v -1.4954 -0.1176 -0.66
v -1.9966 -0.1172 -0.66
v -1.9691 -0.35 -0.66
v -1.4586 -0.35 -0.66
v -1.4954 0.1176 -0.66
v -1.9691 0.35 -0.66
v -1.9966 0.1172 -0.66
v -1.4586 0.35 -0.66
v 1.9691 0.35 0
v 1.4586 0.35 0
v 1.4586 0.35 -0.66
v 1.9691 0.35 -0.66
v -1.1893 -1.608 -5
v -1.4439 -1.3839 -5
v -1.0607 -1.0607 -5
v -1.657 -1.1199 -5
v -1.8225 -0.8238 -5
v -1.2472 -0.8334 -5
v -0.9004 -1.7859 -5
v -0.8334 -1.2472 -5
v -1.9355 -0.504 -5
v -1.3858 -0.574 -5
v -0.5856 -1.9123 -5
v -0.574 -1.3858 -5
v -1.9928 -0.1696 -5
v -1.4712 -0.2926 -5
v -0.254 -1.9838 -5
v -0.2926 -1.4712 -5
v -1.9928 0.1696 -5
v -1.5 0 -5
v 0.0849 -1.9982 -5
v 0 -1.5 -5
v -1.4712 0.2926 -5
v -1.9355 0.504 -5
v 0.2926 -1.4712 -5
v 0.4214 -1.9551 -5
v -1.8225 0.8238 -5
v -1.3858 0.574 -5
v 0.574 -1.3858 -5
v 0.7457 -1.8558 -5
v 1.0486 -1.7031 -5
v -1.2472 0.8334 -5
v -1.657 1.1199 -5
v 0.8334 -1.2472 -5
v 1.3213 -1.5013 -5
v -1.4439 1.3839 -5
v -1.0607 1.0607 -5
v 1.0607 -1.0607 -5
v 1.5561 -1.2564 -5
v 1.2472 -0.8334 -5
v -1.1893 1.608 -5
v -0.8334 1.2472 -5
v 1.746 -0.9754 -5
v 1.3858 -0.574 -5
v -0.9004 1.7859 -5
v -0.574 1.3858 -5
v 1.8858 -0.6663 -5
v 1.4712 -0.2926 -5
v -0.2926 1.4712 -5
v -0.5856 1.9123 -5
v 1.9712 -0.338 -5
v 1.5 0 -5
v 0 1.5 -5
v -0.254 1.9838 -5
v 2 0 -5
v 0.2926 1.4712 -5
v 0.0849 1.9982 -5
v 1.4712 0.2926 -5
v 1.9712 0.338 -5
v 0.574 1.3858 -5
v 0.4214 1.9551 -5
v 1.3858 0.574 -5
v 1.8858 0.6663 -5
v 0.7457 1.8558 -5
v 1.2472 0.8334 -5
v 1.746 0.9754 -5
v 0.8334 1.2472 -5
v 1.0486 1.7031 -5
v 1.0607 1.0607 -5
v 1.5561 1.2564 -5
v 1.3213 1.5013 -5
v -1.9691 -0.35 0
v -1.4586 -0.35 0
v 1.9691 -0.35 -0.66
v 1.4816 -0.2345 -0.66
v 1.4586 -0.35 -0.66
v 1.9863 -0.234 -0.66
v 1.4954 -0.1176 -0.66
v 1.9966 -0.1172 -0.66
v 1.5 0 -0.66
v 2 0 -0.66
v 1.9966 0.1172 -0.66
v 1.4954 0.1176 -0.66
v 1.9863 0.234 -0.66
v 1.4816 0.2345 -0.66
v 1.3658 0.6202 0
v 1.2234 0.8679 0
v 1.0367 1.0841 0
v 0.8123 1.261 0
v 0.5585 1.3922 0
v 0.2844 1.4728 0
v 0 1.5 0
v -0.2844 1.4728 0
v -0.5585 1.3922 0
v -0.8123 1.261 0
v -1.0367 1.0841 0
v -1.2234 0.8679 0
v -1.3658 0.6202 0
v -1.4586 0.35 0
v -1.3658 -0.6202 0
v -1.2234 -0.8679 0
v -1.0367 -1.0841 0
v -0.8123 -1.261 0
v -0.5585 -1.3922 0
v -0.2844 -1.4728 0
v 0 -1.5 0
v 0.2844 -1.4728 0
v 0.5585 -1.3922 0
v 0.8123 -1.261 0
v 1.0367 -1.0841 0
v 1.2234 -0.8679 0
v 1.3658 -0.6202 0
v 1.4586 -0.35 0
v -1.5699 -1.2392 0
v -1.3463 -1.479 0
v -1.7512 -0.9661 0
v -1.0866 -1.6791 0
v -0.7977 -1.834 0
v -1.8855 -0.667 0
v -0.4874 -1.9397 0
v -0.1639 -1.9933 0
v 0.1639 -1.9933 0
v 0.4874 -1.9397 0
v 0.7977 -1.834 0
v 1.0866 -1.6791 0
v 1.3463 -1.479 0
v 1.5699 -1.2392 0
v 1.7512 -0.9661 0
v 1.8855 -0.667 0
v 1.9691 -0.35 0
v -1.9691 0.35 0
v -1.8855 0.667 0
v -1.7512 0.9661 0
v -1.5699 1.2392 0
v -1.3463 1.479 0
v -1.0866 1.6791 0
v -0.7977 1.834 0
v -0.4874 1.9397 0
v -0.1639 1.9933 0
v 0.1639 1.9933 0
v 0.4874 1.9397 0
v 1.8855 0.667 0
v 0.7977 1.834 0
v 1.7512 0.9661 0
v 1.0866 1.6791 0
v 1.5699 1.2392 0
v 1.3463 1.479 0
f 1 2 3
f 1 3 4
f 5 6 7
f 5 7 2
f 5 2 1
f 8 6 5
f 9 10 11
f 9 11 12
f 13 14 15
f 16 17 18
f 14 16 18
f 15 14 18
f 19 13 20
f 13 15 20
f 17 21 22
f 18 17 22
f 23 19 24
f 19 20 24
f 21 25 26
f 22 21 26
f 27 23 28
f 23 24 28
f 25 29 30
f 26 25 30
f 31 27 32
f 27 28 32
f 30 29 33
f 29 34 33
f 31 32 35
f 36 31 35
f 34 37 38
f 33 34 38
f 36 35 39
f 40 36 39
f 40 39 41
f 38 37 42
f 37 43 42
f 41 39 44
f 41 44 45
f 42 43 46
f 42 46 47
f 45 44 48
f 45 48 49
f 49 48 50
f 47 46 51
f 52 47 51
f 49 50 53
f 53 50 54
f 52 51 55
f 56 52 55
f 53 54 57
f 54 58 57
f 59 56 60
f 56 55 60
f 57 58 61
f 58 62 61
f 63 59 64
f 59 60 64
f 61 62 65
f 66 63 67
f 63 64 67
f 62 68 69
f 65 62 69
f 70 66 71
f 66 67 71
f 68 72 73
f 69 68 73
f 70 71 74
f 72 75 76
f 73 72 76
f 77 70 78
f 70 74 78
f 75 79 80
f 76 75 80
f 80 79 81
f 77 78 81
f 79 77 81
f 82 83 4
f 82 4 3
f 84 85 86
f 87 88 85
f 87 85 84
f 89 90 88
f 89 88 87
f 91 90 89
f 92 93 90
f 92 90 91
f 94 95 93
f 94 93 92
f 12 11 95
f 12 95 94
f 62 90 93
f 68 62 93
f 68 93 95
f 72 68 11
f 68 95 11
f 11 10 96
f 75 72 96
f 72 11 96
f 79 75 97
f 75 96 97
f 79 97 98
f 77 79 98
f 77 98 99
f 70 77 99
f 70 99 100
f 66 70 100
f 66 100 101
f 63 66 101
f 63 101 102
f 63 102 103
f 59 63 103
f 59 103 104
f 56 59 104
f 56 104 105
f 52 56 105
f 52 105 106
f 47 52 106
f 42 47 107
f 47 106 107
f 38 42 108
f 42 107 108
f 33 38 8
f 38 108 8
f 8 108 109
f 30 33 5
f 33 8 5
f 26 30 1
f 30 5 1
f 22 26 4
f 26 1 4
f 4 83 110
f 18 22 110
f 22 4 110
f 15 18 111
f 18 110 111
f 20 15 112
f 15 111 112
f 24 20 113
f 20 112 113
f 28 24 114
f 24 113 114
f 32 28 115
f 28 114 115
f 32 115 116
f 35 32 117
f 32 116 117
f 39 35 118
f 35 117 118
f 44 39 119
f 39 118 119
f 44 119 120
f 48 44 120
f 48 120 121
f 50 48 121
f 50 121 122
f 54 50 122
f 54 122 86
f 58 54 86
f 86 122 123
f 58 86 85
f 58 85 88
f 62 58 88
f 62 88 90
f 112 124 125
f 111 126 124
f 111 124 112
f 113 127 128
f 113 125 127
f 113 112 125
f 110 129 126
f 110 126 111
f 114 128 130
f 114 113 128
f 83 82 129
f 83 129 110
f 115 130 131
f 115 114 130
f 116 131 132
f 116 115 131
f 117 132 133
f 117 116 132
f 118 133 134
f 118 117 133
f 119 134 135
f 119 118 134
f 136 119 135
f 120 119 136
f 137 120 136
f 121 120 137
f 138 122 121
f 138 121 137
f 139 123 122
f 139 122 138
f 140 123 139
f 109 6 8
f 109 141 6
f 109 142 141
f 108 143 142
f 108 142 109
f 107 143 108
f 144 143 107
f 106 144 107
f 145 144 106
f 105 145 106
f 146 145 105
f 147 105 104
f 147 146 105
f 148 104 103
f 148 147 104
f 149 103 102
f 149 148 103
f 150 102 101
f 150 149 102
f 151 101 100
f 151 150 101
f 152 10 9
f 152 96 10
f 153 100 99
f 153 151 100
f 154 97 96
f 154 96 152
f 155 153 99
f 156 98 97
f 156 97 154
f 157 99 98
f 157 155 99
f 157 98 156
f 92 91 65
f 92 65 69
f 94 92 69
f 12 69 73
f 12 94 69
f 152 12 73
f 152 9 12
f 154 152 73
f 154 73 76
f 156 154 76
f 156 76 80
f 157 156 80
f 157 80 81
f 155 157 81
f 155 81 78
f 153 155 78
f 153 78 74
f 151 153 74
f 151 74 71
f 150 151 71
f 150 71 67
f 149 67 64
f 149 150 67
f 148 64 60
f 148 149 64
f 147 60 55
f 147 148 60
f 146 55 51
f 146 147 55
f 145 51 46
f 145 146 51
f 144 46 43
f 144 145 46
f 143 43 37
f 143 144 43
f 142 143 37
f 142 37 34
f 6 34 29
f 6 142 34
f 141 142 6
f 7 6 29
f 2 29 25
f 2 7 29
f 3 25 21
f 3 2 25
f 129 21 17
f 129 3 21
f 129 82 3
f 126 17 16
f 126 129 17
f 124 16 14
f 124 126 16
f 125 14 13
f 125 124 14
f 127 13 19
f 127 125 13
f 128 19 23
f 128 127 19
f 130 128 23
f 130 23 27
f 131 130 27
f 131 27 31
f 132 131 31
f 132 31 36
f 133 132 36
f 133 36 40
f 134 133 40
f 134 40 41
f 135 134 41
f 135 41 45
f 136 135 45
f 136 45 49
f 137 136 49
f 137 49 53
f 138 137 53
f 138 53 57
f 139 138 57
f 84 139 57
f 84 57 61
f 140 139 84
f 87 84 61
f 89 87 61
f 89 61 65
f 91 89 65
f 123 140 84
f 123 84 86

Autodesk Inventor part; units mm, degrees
ref_plane "YZ Plane" through (0, 0, 0) normal (1, 0, 0) x (0, 1, 0)
ref_plane "XZ Plane" through (0, 0, 0) normal (0, 1, 0) x (-1, 0, 0)
ref_plane "XY Plane" through (0, 0, 0) normal (0, 0, 1) x (1, 0, 0)
sketch "スケッチ1" plane through (0, 0, 0) normal (0, 0, 1) x (1, 0, 0)
  circle A0 centre (0, 0) radius 2
  circle A1 centre (0, 0) radius 1.5
  line L0 (-2, 0.35) -> (2, 0.35)
  line L1 (2, 0.35) -> (2, -0.35)
  line L2 (2, -0.35) -> (-2, -0.35)
  line L3 (-2, -0.35) -> (-2, 0.35)
  line L4 (-2, 0.35) -> (2, -0.35) construction
  line L5 (2, 0.35) -> (-2, -0.35) construction
  point P0 (1.4586, -0.35)
  point P1 (1.9691, -0.35)
  point P2 (1.9691, 0.35)
  point P3 (1.4586, 0.35)
  point P4 (-1.9691, -0.35)
  point P5 (-1.4586, -0.35)
  point P6 (-1.4586, 0.35)
  point P7 (-1.9691, 0.35)
  dimension "d0" = 4
  dimension "d1" = 3
  dimension "d8" = 0.7
extrude "押し出し1" add sketch "スケッチ1" against normal blind 5 contours A0 L2 A1 L0 | L0 A1 A0 | A0 L2 A1 | L0 A1 L2 A0
thread "ねじ1" size "M3x0.5" class "6H" standard "ANSI Metric M Profile" full length
thread "ねじ2" size "M4x0.5" class "6g" standard "ANSI Metric M Profile" full length
extrude "押し出し2" cut sketch "スケッチ1" against normal blind 0.66 contours A0 L2 A1 L0 | L0 A1 L2 A0
properties part number "IRU-305S" material "ステンレス鋼 AISI 304"
